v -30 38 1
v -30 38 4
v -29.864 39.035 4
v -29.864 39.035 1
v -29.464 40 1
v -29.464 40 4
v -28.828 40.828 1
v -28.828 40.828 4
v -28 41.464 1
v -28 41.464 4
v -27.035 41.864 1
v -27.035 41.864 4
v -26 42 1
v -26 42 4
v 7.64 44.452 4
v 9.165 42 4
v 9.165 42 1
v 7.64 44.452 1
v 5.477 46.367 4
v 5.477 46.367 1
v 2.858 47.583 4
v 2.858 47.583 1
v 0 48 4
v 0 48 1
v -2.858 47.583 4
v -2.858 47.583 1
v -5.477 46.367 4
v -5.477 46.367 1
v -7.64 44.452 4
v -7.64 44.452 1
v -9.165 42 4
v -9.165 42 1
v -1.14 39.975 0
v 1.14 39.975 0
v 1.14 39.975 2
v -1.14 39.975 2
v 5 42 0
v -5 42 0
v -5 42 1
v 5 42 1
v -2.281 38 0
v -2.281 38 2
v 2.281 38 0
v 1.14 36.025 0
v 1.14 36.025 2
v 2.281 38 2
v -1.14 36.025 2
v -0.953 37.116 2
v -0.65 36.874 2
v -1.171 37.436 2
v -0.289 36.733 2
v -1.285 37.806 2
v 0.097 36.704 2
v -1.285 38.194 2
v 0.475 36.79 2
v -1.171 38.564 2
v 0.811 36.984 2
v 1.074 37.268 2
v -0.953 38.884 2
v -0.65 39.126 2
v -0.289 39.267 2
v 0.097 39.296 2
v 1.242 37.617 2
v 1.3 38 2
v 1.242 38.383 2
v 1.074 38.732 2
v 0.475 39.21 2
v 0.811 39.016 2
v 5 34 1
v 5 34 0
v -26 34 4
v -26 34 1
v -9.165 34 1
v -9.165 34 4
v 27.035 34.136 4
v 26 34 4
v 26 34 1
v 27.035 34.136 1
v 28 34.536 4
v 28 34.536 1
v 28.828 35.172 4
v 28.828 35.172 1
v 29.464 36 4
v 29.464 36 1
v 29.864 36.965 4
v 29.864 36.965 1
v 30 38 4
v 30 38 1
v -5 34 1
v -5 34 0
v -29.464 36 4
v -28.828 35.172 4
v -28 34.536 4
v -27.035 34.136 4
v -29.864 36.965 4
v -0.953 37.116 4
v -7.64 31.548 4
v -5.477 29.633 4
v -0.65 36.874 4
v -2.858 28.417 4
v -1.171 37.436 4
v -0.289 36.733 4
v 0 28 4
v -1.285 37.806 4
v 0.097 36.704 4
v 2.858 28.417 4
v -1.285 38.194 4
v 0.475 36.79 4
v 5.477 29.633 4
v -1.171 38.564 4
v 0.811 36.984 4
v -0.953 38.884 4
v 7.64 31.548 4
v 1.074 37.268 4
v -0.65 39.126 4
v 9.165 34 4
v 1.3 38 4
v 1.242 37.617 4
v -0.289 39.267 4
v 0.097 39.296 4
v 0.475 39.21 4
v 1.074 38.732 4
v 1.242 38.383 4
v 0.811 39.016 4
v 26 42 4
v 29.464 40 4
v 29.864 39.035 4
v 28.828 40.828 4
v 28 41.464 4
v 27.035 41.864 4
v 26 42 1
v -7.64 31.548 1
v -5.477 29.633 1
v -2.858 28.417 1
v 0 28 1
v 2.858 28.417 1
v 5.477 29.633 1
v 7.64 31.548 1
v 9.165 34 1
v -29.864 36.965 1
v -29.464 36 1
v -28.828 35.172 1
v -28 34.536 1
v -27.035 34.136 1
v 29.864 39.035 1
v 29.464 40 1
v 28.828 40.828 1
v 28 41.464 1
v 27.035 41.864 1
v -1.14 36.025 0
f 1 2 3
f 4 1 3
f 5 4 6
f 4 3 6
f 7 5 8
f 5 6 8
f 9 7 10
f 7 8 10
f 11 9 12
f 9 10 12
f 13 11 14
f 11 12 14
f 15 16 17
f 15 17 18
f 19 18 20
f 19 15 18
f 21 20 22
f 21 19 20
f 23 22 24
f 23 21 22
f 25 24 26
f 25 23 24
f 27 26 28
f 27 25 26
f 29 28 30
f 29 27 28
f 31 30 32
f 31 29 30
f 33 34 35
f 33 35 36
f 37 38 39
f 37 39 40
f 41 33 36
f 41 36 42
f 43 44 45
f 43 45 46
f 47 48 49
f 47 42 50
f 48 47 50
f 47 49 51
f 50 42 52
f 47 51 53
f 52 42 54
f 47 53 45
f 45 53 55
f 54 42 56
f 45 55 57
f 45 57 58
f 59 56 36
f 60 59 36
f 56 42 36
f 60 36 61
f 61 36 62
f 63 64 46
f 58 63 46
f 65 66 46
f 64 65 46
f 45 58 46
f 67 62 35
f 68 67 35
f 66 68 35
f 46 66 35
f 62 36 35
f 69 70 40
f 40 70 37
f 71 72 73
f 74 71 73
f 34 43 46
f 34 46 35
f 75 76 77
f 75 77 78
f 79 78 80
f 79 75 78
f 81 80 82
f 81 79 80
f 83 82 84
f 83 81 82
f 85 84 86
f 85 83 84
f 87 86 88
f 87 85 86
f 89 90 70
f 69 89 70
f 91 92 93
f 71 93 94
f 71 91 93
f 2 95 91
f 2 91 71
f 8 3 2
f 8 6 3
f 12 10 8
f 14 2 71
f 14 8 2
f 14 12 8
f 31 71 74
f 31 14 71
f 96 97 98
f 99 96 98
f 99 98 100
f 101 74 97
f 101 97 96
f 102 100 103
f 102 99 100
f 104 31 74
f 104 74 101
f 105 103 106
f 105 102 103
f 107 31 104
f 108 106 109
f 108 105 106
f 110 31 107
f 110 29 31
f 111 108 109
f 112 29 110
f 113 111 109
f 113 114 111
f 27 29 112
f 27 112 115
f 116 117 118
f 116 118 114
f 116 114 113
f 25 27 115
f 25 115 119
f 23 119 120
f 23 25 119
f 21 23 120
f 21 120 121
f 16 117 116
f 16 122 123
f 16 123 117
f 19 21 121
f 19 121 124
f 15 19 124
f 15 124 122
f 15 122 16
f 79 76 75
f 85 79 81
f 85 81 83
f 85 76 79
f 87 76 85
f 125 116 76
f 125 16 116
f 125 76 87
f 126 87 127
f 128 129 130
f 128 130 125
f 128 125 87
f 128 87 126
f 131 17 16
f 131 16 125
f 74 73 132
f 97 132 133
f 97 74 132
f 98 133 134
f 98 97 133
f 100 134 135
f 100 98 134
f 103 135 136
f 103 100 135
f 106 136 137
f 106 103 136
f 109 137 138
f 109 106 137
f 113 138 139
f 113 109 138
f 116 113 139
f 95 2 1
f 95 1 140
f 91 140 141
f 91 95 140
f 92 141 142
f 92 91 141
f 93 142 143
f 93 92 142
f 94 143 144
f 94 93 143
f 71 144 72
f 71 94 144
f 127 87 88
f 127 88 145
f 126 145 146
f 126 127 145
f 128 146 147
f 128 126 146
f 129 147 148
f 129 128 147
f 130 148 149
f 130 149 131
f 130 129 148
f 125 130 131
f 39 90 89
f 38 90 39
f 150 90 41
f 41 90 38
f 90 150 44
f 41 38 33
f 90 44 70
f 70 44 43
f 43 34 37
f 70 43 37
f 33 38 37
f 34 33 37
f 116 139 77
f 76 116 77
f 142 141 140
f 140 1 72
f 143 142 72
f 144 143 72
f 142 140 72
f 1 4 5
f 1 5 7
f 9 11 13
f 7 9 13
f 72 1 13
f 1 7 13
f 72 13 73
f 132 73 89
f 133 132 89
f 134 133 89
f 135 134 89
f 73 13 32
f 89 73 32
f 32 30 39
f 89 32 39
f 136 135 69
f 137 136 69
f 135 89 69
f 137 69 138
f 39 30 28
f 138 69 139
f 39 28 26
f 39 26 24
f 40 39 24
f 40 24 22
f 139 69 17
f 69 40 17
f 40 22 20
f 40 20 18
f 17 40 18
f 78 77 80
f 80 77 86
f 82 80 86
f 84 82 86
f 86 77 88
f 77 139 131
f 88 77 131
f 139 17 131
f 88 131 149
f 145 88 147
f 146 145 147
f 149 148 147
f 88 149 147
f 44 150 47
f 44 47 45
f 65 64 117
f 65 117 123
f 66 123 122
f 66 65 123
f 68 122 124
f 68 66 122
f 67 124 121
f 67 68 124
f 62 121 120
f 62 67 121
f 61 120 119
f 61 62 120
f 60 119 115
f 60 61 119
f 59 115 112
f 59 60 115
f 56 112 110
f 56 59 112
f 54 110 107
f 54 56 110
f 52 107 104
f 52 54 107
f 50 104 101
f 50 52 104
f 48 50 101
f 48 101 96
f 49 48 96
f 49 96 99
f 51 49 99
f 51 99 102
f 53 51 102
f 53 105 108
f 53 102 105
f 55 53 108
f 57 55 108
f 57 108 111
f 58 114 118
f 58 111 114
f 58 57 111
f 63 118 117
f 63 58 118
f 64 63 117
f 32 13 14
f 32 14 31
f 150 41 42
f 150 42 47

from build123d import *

# Parameters (mm, degrees)
F2_W      = 60
F2_H      = 8
F2_R      = 3
F4_DEPTH  = 4
F5_R      = 3.99999
F6_R      = 10
F7_DEPTH  = 3
F3_R      = 1.3
F8_DEPTH  = 4.001
F9_W      = 25
F9_H      = 8
F10_DEPTH = 1
F11_DEPTH = 2


# Not quite as in the source:
# - a fillet or chamfer is up to 0.001 mm smaller than in the source, because OpenCascade refuses the exact size


with BuildPart() as f4:
    # F2 (on face) → F4 (new body)
    with BuildSketch(Plane.XY):
        with Locations((0, 38)):
            Rectangle(F2_W, F2_H)
        with Locations((-26, 38)):
            Circle(F2_R, mode=Mode.SUBTRACT)
        Polygon((1.1402667816, 36.025), (0, 36.025), (-1.1402667816, 36.025), (-2.2805335633, 38), (-1.1402667816, 39.975), (0, 39.975), (1.1402667816, 39.975), (2.2805335633, 38), align=None, mode=Mode.SUBTRACT)
        with Locations((26, 38)):
            Circle(F2_R, mode=Mode.SUBTRACT)
        Polygon((-1.1402667816, 36.025), (0, 36.025), (1.1402667816, 36.025), (2.2805335633, 38), (1.1402667816, 39.975), (0, 39.975), (-1.1402667816, 39.975), (-2.2805335633, 38), align=None)
        with Locations((-26, 38)):
            Circle(F2_R)
        with Locations((26, 38)):
            Circle(F2_R)
    extrude(amount=F4_DEPTH)

    # F5 (radius 4 in the source; OpenCascade refuses exactly that, so slightly less here)
    f5_edges = [f4.edges().sort_by_distance(p)[0] for p in [
        (-30, 42, 2),
        (-30, 34, 2),
        (30, 42, 2),
        (30, 34, 2),
    ]]
    fillet(f5_edges, radius=F5_R)

    # F6 (on face) → F7 (join)
    with BuildSketch(Plane.XY.offset(4)):
        with Locations((0, 38)):
            Circle(F6_R)
    extrude(amount=-F7_DEPTH)

    # F3 (on face) → F8 (cut, through all)
    with BuildSketch(Plane.XY):
        with Locations((0, 38)):
            Circle(F3_R)
    extrude(amount=F8_DEPTH, mode=Mode.SUBTRACT)

    # F9 (on face) → F10 (cut)
    with BuildSketch(Plane.XY):
        with Locations((17.5, 38)):
            Rectangle(F9_W, F9_H)
        with Locations((-17.5, 38)):
            Rectangle(F9_W, F9_H)
    extrude(amount=F10_DEPTH, mode=Mode.SUBTRACT)

    # F2 (on face) → F11 (cut)
    with BuildSketch(Plane.XY):
        Polygon((-1.1402667816, 36.025), (0, 36.025), (1.1402667816, 36.025), (2.2805335633, 38), (1.1402667816, 39.975), (0, 39.975), (-1.1402667816, 39.975), (-2.2805335633, 38), align=None)
    extrude(amount=F11_DEPTH, mode=Mode.SUBTRACT)


solid = f4.part
